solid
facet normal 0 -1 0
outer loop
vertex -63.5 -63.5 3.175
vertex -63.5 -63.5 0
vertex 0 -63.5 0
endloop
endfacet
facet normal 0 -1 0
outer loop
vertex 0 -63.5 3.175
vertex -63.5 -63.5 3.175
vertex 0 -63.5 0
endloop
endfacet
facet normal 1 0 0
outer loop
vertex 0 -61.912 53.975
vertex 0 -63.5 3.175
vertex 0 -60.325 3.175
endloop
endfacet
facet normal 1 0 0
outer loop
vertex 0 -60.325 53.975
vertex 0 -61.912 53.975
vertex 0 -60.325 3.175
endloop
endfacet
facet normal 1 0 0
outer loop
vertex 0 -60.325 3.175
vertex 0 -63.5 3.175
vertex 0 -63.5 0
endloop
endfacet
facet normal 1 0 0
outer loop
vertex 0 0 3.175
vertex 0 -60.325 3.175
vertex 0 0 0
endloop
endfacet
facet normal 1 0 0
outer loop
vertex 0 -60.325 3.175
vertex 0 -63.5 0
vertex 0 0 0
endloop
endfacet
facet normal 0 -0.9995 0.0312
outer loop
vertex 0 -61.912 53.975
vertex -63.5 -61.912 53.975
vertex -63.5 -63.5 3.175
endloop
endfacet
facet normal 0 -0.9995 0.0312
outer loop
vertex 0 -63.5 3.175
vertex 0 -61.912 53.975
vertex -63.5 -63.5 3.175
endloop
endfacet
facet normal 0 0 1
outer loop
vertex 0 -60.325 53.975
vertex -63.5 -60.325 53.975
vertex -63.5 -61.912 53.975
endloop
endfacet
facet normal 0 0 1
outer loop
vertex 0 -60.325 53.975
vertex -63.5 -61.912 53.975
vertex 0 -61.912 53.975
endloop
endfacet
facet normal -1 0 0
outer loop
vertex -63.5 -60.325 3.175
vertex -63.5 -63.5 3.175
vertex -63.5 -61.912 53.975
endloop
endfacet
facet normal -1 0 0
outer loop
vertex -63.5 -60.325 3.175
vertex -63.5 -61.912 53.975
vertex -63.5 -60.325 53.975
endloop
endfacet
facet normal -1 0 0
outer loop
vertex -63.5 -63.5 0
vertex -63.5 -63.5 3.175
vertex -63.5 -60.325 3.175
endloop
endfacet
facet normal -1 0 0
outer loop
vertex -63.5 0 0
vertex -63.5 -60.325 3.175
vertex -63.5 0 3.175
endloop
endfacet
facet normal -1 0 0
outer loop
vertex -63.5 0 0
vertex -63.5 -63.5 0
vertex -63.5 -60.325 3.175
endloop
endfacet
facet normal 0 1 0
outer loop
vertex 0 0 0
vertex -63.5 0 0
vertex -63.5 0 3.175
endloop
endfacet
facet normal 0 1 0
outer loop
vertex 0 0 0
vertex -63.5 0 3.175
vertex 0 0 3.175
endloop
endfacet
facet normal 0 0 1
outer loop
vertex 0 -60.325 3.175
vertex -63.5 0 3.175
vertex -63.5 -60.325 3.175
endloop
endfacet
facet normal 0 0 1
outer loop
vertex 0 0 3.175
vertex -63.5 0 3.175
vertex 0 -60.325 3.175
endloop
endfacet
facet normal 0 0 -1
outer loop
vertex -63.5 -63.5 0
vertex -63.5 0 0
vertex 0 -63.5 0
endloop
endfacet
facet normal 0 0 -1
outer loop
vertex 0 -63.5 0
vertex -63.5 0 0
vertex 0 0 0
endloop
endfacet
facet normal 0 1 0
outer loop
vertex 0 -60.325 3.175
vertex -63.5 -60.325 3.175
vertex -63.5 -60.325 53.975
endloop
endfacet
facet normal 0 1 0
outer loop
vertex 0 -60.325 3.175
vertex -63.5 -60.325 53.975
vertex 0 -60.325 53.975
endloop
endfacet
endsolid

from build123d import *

# Parameters (mm, degrees)
F0_W     = 63.5
F0_H     = 63.5
F1_DEPTH = 3.175
F2_W     = 63.5
F2_H     = 3.175
F3_DEPTH = 50.8
F5_DEPTH = 63.5


with BuildPart() as f1:
    # F0 (on Top) → F1 (new body)
    with BuildSketch(Plane.XY):
        with Locations((-31.75, -31.75)):
            Rectangle(F0_W, F0_H)
    extrude(amount=F1_DEPTH)

    # F2 (on face) → F3 (join)
    with BuildSketch(Plane.XY.offset(3.175)):
        with Locations((-31.75, -61.9125)):
            Rectangle(F2_W, F2_H)
    extrude(amount=F3_DEPTH)

    # F4 (on face) → F5 (cut)
    with BuildSketch(Plane(origin=(-63.5, 0, 0), x_dir=(0, -1, 0), z_dir=(-1, 0, 0))):
        Polygon((61.9125, 53.975), (63.5, 3.175), (63.5, 53.975), align=None)
    extrude(amount=-F5_DEPTH, mode=Mode.SUBTRACT)


solid = f1.part
